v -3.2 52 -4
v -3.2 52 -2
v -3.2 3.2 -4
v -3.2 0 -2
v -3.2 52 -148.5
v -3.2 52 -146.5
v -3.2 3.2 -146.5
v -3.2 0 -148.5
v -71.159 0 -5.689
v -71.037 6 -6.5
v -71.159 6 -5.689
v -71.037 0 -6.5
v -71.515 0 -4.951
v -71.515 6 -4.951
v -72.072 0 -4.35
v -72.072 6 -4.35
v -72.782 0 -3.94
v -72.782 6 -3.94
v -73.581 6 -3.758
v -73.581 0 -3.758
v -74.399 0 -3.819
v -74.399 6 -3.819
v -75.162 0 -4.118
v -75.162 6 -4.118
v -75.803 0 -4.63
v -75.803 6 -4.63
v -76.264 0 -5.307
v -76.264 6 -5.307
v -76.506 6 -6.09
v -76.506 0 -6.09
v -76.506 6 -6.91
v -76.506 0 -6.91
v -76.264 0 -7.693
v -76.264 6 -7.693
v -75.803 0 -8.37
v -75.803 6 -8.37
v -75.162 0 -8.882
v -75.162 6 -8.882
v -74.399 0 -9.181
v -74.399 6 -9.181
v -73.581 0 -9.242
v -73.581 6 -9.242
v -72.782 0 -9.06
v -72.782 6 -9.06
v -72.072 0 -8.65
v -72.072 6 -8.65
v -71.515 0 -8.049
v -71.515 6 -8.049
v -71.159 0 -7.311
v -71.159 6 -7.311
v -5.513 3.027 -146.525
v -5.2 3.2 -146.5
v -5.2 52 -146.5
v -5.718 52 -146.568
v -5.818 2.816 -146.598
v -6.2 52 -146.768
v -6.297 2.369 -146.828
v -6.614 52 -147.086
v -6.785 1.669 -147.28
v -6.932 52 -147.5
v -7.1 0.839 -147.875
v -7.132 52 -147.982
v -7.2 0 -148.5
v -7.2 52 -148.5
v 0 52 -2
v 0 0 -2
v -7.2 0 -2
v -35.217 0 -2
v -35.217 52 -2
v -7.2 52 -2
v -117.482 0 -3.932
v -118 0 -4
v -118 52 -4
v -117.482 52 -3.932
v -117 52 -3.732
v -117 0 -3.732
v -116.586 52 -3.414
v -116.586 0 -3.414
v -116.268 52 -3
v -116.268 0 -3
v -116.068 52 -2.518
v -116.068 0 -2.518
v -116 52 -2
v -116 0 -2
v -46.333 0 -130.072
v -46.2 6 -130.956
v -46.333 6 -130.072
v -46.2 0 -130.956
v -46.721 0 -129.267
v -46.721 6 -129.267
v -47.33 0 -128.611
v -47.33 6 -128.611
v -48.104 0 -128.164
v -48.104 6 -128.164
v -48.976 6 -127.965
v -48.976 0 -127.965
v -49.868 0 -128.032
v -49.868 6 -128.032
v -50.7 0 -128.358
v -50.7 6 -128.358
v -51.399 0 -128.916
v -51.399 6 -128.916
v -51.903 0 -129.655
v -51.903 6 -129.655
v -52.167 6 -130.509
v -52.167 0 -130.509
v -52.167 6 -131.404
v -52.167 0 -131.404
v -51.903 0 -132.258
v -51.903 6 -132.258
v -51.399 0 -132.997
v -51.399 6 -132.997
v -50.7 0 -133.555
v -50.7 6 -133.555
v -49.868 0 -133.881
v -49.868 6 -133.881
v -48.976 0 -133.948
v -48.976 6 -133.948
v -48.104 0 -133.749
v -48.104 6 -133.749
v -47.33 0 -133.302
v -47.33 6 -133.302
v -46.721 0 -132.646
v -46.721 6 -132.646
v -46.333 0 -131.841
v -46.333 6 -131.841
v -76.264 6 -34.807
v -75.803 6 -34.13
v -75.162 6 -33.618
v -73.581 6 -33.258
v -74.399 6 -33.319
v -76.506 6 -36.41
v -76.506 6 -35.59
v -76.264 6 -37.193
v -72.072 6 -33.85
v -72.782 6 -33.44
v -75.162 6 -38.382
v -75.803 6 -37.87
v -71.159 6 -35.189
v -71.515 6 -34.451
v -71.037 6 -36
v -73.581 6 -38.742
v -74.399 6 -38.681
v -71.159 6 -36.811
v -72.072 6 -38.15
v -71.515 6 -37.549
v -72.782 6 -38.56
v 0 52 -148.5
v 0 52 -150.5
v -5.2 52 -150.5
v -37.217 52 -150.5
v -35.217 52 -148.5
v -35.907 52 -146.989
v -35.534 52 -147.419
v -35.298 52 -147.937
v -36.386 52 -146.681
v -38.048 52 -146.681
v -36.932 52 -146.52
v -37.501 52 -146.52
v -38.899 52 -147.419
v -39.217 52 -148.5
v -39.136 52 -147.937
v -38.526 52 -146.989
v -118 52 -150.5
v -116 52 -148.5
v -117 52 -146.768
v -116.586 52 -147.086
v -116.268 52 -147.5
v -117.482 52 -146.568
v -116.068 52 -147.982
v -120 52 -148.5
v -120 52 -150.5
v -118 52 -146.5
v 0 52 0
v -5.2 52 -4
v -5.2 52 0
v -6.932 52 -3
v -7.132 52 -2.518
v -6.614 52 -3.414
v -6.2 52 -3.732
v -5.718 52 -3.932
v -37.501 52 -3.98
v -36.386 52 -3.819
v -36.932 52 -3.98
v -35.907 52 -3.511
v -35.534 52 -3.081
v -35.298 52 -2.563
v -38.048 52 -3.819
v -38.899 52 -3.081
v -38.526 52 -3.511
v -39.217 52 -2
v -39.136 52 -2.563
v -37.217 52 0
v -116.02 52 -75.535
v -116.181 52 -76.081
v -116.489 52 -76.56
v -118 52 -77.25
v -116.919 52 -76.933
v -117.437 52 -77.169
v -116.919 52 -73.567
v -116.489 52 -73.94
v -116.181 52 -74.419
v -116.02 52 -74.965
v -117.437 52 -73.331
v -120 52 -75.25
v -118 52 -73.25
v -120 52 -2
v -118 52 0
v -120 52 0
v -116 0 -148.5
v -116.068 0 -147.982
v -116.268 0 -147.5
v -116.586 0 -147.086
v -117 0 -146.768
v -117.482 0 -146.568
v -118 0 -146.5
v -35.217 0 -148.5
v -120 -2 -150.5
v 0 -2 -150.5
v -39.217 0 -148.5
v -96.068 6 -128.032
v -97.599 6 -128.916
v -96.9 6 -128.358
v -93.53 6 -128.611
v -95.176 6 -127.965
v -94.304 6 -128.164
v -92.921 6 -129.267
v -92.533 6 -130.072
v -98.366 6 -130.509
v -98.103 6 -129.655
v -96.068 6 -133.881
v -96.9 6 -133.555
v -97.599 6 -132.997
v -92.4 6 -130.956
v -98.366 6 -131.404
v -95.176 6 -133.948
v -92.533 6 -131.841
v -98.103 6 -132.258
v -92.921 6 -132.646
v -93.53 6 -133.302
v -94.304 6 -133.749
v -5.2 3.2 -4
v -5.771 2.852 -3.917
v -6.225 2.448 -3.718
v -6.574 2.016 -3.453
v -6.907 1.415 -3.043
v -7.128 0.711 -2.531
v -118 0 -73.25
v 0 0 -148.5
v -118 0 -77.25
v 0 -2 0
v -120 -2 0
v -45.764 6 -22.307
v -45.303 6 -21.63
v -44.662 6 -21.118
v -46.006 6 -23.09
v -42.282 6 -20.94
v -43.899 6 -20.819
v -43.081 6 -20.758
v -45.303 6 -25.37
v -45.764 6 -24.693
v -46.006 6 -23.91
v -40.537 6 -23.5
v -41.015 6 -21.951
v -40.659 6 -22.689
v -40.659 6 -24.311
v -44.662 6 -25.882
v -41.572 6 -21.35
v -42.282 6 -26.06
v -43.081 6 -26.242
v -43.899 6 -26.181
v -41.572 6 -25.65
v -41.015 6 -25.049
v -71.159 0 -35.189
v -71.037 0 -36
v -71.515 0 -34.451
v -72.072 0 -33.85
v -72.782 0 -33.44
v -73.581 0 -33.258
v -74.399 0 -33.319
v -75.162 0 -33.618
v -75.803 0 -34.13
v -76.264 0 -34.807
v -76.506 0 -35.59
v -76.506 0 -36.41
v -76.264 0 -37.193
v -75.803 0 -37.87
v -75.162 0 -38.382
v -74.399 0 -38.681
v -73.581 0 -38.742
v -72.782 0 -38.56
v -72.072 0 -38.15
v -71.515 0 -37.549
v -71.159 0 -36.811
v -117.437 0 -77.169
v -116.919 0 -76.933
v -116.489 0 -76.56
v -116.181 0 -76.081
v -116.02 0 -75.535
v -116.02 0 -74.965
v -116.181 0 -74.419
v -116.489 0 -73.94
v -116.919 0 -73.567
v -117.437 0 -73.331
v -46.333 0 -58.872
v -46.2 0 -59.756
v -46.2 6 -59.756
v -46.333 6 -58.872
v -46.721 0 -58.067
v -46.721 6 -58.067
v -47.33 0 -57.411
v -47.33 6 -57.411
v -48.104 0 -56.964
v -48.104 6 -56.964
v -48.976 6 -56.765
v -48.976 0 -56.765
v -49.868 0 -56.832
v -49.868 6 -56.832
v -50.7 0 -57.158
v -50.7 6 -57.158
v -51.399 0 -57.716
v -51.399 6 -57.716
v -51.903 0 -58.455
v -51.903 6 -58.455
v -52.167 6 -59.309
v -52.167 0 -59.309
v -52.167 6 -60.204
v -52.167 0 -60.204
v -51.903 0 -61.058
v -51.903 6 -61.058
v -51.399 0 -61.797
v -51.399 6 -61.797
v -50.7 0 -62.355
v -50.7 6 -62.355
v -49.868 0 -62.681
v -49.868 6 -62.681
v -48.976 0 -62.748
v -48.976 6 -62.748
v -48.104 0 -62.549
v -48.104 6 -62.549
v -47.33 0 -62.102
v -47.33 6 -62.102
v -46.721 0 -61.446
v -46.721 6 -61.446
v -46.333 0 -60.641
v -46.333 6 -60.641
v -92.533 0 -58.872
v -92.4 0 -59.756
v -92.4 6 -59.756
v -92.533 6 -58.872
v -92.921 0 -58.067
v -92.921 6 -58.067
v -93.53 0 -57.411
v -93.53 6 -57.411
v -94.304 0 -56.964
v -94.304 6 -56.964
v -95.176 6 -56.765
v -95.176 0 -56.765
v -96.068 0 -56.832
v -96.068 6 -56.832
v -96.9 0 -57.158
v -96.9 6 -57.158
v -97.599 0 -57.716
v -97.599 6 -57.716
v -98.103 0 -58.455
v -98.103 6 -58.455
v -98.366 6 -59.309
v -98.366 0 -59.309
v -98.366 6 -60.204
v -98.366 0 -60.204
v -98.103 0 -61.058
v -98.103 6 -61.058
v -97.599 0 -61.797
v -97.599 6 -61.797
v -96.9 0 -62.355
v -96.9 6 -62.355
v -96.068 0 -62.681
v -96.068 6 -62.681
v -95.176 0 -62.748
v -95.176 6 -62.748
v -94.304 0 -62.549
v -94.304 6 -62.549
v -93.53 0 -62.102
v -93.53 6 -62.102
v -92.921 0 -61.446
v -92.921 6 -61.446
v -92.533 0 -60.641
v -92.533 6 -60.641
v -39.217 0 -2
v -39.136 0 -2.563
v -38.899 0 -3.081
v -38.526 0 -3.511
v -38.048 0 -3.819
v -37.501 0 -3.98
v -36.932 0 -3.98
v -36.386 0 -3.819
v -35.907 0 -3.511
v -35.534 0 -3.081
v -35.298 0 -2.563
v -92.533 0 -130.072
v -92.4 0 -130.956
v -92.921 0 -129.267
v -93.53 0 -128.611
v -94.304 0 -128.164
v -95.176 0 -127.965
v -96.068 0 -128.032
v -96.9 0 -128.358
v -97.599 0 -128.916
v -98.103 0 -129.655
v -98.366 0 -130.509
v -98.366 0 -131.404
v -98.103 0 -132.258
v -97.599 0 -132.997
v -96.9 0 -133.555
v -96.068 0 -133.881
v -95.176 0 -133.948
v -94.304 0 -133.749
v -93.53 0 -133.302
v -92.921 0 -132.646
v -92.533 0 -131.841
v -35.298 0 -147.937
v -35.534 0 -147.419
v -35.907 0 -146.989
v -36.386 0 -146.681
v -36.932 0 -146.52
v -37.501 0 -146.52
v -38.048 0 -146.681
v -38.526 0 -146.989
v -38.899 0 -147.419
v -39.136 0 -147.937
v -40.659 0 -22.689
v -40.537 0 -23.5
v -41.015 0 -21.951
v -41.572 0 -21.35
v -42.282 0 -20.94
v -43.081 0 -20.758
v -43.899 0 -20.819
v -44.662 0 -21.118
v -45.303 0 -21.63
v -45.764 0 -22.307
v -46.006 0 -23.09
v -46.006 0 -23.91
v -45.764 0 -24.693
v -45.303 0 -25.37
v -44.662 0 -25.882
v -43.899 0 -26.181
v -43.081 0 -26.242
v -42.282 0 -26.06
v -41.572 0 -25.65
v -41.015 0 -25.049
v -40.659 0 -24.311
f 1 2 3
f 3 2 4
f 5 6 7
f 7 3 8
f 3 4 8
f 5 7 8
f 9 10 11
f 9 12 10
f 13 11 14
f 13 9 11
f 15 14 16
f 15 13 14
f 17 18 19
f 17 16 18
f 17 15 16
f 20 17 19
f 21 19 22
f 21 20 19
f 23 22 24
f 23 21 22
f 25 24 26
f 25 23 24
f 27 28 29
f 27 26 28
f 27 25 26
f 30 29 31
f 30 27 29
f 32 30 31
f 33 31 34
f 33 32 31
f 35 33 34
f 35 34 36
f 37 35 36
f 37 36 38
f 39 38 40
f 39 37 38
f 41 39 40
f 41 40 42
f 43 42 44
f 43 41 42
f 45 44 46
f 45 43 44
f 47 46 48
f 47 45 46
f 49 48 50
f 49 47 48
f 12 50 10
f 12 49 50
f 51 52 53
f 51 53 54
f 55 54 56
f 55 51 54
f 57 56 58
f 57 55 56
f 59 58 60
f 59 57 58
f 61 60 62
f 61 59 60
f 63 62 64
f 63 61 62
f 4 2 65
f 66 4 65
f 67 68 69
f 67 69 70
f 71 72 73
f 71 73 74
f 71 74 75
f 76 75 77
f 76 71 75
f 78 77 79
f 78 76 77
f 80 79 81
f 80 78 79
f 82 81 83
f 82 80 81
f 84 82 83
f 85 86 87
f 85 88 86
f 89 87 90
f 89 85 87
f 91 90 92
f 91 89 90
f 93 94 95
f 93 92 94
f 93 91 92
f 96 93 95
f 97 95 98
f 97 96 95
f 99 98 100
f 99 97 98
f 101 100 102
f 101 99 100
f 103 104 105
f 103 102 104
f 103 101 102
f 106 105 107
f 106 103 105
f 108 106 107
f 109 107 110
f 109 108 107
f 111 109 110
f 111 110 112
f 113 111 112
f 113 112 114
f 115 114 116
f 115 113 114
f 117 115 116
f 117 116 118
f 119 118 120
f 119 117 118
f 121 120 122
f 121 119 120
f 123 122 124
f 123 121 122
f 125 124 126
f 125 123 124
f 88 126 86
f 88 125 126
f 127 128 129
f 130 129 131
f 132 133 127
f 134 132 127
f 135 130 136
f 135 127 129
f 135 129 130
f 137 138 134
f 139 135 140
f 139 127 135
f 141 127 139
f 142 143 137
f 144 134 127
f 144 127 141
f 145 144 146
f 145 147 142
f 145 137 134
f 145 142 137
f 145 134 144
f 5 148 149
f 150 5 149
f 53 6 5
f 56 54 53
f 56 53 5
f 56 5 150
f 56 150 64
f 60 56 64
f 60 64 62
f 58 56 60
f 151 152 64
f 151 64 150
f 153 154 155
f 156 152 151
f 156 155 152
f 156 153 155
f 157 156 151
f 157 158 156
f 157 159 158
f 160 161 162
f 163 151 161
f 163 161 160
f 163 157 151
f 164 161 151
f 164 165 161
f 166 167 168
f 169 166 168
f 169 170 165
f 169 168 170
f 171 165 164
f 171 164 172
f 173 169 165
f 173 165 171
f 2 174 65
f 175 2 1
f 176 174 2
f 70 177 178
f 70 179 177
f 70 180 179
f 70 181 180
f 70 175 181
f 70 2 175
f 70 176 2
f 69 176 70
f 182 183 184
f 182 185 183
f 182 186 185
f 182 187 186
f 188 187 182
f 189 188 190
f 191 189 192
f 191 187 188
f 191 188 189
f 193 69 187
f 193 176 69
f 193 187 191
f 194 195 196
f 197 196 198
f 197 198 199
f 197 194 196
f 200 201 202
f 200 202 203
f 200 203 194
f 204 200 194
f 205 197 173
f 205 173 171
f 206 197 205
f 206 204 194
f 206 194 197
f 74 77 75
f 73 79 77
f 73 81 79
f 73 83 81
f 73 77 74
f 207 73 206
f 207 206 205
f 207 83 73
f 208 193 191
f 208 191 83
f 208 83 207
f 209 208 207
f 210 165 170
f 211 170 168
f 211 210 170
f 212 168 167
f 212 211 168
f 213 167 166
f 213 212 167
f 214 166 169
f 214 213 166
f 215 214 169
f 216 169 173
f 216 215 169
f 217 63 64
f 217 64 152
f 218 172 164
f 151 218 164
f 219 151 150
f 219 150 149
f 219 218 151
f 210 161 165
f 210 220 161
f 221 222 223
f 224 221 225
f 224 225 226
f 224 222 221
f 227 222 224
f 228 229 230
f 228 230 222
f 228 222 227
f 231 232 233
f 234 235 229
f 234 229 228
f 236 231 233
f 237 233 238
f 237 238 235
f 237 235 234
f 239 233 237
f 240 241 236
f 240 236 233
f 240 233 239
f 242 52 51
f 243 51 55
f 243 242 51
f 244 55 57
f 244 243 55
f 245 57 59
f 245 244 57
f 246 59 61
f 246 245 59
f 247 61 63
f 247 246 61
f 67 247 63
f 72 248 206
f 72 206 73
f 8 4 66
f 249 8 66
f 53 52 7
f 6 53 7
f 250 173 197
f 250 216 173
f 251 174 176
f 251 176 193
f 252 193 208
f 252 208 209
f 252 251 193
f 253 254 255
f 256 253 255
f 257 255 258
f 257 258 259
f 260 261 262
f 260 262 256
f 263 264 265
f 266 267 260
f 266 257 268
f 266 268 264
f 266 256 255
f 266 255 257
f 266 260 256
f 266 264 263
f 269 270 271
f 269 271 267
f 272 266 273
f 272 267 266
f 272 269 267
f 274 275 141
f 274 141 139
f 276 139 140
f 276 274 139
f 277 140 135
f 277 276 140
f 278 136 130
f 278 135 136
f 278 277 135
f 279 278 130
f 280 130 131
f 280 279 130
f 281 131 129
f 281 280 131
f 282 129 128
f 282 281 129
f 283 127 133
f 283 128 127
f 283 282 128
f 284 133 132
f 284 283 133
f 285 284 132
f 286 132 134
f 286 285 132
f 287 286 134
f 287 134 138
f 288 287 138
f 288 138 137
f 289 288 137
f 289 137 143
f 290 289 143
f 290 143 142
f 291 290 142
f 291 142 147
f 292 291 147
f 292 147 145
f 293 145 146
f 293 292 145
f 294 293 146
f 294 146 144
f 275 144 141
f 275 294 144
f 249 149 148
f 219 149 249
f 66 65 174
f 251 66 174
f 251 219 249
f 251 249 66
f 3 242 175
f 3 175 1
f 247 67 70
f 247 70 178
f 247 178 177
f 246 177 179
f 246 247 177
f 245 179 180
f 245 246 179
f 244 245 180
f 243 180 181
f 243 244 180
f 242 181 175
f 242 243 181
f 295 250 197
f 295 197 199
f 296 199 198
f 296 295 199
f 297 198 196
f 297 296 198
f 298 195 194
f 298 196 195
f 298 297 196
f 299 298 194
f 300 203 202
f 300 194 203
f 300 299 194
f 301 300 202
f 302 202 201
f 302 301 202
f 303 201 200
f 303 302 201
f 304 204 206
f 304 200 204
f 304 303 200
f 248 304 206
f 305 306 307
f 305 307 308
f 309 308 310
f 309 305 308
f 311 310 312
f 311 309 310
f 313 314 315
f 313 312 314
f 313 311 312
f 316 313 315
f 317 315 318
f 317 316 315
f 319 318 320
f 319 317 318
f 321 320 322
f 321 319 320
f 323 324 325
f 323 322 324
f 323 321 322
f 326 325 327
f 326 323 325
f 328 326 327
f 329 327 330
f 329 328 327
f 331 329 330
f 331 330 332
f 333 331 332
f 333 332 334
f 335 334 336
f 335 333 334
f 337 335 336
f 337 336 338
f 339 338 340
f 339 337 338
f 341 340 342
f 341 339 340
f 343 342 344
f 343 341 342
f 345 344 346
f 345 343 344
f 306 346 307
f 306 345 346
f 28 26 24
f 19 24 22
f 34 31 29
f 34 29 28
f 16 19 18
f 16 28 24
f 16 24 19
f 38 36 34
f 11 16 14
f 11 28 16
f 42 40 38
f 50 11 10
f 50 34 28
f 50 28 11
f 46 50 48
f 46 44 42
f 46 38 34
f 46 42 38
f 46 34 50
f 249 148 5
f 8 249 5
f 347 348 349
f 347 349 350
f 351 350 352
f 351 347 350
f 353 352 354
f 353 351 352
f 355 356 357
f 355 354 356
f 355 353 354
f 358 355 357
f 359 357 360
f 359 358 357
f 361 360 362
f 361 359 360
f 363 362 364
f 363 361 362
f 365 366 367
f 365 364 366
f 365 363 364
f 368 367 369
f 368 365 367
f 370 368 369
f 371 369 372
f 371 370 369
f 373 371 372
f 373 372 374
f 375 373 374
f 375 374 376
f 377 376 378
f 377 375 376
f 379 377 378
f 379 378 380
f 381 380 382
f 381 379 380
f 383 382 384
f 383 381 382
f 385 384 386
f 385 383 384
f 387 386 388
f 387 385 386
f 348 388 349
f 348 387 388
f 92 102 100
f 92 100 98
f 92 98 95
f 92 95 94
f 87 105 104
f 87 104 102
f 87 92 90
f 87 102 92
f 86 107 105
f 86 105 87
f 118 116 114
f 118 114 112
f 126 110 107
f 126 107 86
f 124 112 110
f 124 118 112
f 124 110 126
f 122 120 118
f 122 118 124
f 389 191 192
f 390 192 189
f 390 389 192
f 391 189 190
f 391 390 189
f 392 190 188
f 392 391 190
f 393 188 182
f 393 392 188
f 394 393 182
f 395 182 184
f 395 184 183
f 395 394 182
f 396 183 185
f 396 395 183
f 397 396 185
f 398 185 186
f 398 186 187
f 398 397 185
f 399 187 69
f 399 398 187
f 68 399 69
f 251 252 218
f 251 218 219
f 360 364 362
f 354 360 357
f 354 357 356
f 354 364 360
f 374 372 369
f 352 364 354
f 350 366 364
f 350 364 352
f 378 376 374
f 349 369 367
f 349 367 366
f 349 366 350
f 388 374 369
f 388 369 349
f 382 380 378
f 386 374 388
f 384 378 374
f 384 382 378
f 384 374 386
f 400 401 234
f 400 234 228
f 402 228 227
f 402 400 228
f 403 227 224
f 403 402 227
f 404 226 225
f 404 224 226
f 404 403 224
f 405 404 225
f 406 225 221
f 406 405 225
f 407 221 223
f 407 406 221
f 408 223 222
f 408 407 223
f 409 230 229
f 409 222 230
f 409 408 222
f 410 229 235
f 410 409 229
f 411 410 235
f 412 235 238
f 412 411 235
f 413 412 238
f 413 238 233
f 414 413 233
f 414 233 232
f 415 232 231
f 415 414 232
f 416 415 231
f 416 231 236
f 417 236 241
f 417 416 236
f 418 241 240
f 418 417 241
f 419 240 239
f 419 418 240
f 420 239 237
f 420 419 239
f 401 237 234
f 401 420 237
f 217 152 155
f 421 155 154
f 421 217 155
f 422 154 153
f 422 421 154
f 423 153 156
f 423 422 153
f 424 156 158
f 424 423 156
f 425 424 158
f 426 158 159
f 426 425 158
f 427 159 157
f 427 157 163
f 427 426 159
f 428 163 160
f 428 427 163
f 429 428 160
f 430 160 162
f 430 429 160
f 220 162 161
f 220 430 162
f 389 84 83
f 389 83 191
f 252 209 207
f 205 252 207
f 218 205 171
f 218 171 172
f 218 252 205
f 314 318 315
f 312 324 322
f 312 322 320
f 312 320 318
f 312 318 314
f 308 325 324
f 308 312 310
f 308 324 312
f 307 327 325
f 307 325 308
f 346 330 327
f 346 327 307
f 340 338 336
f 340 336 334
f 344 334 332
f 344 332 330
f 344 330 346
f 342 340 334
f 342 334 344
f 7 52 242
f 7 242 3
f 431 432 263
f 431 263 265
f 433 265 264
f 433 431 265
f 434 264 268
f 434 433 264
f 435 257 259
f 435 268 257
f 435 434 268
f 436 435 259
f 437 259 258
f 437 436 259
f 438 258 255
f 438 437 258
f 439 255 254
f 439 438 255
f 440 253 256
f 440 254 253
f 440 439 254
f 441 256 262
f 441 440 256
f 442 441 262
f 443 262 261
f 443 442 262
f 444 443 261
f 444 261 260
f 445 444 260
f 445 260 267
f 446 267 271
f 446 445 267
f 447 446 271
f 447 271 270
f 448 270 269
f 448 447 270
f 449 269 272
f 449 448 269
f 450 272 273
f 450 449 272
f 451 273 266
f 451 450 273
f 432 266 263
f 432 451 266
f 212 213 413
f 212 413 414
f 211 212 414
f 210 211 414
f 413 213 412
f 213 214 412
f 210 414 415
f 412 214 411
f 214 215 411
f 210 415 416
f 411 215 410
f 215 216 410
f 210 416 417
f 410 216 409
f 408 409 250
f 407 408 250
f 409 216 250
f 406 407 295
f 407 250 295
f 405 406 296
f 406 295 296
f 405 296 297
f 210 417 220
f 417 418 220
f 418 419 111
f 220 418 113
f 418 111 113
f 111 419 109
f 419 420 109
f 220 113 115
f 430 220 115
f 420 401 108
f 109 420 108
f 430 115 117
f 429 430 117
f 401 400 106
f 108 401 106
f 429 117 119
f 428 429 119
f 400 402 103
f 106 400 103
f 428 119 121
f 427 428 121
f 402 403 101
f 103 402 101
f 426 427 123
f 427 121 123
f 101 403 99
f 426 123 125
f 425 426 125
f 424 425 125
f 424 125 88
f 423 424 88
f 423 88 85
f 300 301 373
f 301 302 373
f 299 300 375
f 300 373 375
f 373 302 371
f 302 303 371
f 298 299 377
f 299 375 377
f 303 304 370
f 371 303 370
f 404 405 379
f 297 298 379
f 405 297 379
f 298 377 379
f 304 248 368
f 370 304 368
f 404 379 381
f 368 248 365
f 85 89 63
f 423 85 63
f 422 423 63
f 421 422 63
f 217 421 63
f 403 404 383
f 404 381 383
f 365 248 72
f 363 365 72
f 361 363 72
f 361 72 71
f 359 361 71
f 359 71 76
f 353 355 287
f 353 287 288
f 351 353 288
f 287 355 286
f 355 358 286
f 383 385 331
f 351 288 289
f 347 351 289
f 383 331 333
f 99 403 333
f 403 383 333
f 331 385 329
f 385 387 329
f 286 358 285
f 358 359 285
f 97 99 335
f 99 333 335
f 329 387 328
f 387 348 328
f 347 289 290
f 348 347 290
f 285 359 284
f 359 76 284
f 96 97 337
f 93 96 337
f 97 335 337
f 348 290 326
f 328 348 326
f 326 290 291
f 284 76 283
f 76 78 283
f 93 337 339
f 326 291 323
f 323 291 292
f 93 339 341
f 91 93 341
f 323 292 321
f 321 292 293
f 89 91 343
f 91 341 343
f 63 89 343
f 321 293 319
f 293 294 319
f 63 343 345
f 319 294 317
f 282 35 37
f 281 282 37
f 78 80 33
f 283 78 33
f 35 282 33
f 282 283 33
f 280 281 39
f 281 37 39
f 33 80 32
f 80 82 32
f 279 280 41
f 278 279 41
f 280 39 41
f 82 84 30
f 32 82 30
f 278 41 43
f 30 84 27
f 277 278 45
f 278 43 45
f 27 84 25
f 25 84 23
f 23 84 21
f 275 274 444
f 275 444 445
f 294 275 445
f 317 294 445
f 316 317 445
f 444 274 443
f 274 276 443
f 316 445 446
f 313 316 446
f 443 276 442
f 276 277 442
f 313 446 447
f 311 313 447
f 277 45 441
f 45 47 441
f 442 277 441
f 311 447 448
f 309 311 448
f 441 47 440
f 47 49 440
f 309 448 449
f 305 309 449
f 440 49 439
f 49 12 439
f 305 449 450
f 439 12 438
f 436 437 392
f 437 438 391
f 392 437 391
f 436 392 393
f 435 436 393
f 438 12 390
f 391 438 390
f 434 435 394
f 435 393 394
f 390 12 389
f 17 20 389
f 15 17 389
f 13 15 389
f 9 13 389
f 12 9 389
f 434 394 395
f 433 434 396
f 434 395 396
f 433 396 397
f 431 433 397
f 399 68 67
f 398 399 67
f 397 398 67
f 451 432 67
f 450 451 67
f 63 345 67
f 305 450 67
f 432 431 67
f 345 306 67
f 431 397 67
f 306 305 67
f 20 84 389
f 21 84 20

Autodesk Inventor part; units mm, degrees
ref_plane "YZ Plane" through (0, 0, 0) normal (1, 0, 0) x (0, 1, 0)
ref_plane "XZ Plane" through (0, 0, 0) normal (0, 1, 0) x (-1, 0, 0)
ref_plane "XY Plane" through (0, 0, 0) normal (0, 0, 1) x (1, 0, 0)
sketch "Sketch1" plane through (0, 0, 0) normal (0, 1, 0) x (-1, 0, 0)
  line L0 (0, 0) -> (120, 0)
  line L1 (120, 0) -> (120, -150.5)
  line L2 (120, -150.5) -> (0, -150.5)
  line L3 (0, -150.5) -> (0, 0)
  line L4 (118, -148.5) -> (118, -2)
  line L5 (118, -2) -> (2, -2)
  line L6 (0, -148.5) -> (118, -148.5)
  line L7 (2, -2) -> (0, -2)
  line L8 (1.5, -2) -> (1.5, -148.5)
  point P0 (0, -144.5)
  dimension "d0" = 150.5
  dimension "d1" = 120
  dimension "d2" = 2
  dimension "d3" = 1.5
  dimension "d13" = 2
  dimension "d14" = 2
extrude "Extrusion1" add sketch "Sketch1" along normal blind 52 contours L0 L1 L2 L3 L6 L4 L5 L7
sketch "Sketch2" plane through (0, 0, 0) normal (0, -1, 0) x (1, 0, 0)
  line L0 (-120, -150.5) -> (-120, 0) projected
  line L1 (0, -150.5) -> (-120, -150.5) projected
  line L2 (0, -148.5) -> (0, -150.5) projected
  line L3 (-118, -148.5) -> (0, -148.5) projected
  line L4 (0, 0) -> (0, -2) projected
  line L5 (-120, 0) -> (0, 0) projected
  line L6 (0, -150.5) -> (-120, -150.5)
  line L7 (-120, -150.5) -> (-120, 0)
  line L8 (-120, 0) -> (0, 0)
  line L9 (0, 0) -> (0, -150.5)
  line L10 (-118, -2) -> (-118, -148.5) projected
  line L11 (0, -2) -> (-118, -2) projected
extrude "Extrusion2" add sketch "Sketch2" along normal blind 2
sketch "Sketch3" plane through (0, 0, 0) normal (0, 1, 0) x (1, 0, 0)
  line L0 (0, 2) -> (-118, 2) projected
  line L1 (0, 148.5) -> (0, 2) projected
  line L2 (-118, 148.5) -> (0, 148.5) projected
  line L3 (-118, 2) -> (-118, 148.5) projected
  line L4 (-3.2, 2) -> (-3.2, 148.5)
  circle A0 centre (-118, 2) radius 2
  line L5 (-120, 0) -> (-120, 150.5) projected
  circle A1 centre (-118, 148.5) radius 2
  circle A2 centre (-5.2, 2) radius 2
  line L6 (-120, 0) -> (0, 0) projected
  line L7 (-5.2, 4) -> (-3.2, 4)
  circle A3 centre (-5.2, 148.5) radius 2
  line L8 (-5.2, 146.5) -> (-3.2, 146.5)
  circle A4 centre (-118, 75.25) radius 2
  line L9 (0, 150.5) -> (-120, 150.5) projected
  circle A5 centre (-37.2167, 2) radius 2
  circle A6 centre (-37.2167, 148.5) radius 2
  point P0 (-59, 2)
  point P1 (-7.2, 148.5)
  point P2 (-3.2, 146.5)
  point P3 (-3.2, 148.5)
  point P4 (-7.2, 2)
  point P5 (-118, 146.5)
  point P6 (-116, 148.5)
  point P7 (-116, 2)
  point P8 (-118, 4)
  point P9 (-118, 73.25)
  point P10 (-118, 77.25)
  dimension "d15" = 3.2
extrude "Extrusion3" add sketch "Sketch3" along normal up to surface (52 mm away) contours A2 L0 | A2 L7 L4 | L0 A2 | A3 L2 | L4 L8 A3 | L2 A3 | A5 L0 | L0 A5 | A0 L3 L0 | A6 L2 | L2 A6 | L0 L3 A0 | A1 L2 L3 | A4 L3 | A1 L3 L2 | L3 A4
sketch "Sketch6" plane through (0, 0, -2) normal (0, 0, -1) x (-1, 0, 0)
  line L0 (5.2, 52) -> (3.2, 52) projected
  line L1 (3.2, 0) -> (3.2, 52) projected
  line L2 (5.2, 0) -> (3.2, 0) projected
  line L3 (5.2, 0) -> (5.2, 52) projected
  line L4 (7.2, 52) -> (7.2, 0) projected
  line L5 (7.2, 52) -> (5.2, 52) projected
  line L6 (5.2, 0) -> (5.2, 52) projected
  line L7 (7.2, 0) -> (5.2, 0) projected
  line L8 (3.2, 0) -> (5.2, 0)
  line L9 (5.2, 0) -> (5.2, 3.2)
  line L10 (5.2, 3.2) -> (3.2, 3.2)
  line L11 (3.2, 3.2) -> (3.2, 0)
  arc A0 (7.2, 0) -> (5.2, 3.2) centre (3.64, 0) ccw
  point P0 (0, 0)
  point P1 (3.2, 3.2)
  dimension "d29" = 3.2
extrude "Extrusion5" add sketch "Sketch6" along normal through all contours A0 L7 L3 | L3 L2 L1 L10
sketch "Sketch7" plane through (0, 0, 0) normal (0, 1, 0) x (1, 0, 0)
  line L0 (-7.2, 2) -> (-3.2, 2) projected
  line L1 (-3.2, 4) -> (-3.2, 146.5) projected
  circle A0 centre (-73.7868, 6.5) radius 1.5
  circle A1 centre (-73.7868, 36) radius 1.5
  line L2 (-39.2167, 2) -> (-116, 2) projected
  line L3 (-77.4105, 0.6903) -> (-77.4105, 39.7313) construction
  line L4 (-77.4105, 39.7313) -> (-39.4979, 39.7313) construction
  line L5 (-39.4979, 39.7313) -> (-39.4979, 0.6903) construction
  line L6 (-39.4979, 0.6903) -> (-77.4105, 0.6903) construction
  circle A2 centre (-43.2868, 23.5) radius 1.5
  circle A3 centre (-73.7868, 6.5) radius 2.75
  circle A4 centre (-73.7868, 36) radius 2.75
  circle A5 centre (-43.2868, 23.5) radius 2.75
  point P0 (0, 0)
  point P1 (-57, 2)
  dimension "d35" = 29.5
  dimension "d38" = 3
  dimension "d39" = 3
  dimension "d40" = 4.5
  dimension "d68" = 3
  dimension "d69" = 30.5
  dimension "d70" = 12.5
  dimension "d71" = 5.5
  dimension "d72" = 5.5
  dimension "d73" = 5.5
extrude "Extrusion6" add sketch "Sketch7" along normal blind 6 contours A0 | A1 | A2 | A3 | A4 | A5
sketch "Sketch8" plane through (0, 0, 0) normal (0, 1, 0) x (1, 0, 0)
  circle A0 centre (-49.2001, 130.9565) radius 3
  circle A1 centre (-49.2001, 59.7565) radius 3
  circle A2 centre (-95.4, 59.7565) radius 3
  circle A3 centre (-95.4, 130.9565) radius 3
  circle A4 centre (-49.2001, 130.9565) radius 3
  circle A5 centre (-49.2001, 59.7565) radius 3
  circle A6 centre (-95.4, 59.7565) radius 3
  circle A7 centre (-95.4, 130.9565) radius 3
  point P0 (0, 0)
  point P1 (-129.8781, 142.9288)
  dimension "d76" = 71.2
  dimension "d77" = 46.2
extrude "Extrusion7" add sketch "Sketch8" along normal blind 6
equation "\"d13\" = d2"
properties part number "controller-base"
